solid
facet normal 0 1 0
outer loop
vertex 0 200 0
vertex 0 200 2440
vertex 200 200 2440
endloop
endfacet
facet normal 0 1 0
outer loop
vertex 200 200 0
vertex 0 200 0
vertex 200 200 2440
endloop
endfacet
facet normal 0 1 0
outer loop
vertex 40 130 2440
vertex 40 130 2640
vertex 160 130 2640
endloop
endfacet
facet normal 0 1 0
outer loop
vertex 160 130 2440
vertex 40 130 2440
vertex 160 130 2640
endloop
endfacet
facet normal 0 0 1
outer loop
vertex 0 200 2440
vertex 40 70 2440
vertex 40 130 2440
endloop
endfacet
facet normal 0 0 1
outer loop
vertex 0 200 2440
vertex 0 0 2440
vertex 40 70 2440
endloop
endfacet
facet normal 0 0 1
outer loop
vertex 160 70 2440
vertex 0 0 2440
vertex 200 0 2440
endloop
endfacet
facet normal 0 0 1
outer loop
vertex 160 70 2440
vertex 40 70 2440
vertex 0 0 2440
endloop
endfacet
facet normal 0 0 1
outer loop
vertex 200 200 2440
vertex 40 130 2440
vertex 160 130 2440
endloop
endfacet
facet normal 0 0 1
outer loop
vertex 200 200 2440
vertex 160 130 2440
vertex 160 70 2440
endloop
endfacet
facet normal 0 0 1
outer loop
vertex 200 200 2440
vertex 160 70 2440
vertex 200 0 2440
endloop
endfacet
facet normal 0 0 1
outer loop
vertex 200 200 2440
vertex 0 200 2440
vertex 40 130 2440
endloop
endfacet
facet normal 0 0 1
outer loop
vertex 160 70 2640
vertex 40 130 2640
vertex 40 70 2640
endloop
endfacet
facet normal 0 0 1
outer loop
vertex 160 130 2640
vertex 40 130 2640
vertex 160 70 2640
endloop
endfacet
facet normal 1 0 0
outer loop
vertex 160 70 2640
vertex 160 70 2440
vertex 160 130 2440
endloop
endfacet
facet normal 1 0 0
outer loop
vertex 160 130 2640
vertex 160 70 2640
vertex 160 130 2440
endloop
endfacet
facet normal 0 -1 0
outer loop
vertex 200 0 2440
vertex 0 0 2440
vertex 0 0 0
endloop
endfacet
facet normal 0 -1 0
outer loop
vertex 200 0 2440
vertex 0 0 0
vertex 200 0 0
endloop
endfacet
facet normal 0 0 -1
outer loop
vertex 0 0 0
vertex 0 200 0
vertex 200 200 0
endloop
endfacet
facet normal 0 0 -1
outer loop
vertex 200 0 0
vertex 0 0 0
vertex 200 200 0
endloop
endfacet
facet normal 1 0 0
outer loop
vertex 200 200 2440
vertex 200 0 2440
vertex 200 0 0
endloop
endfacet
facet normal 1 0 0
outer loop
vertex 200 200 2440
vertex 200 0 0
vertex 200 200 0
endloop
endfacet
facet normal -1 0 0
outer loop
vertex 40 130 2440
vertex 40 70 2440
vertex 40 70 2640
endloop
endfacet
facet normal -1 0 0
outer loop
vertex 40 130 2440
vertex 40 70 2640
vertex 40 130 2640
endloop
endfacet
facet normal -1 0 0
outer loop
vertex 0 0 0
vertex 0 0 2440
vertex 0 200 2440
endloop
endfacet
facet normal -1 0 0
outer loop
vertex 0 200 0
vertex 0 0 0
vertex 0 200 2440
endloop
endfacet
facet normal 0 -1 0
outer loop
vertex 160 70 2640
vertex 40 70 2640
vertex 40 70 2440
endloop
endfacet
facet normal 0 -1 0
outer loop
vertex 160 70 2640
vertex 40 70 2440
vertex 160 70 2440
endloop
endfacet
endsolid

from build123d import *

# Parameters (mm, degrees)
F0_W     = 200
F0_H     = 200
F1_DEPTH = 2640
F2_W     = 200
F2_H     = 200
F2_W_2   = 120
F2_H_2   = 60
F3_DEPTH = 200


with BuildPart() as f1:
    # F0 (on Top) → F1 (new body)
    with BuildSketch(Plane.XY):
        with Locations((100, 100)):
            Rectangle(F0_W, F0_H)
    extrude(amount=F1_DEPTH)

    # F2 (on face) → F3 (cut)
    with BuildSketch(Plane.XY.offset(2640)):
        with Locations((100, 100)):
            Rectangle(F2_W, F2_H)
        with Locations((100, 100)):
            Rectangle(F2_W_2, F2_H_2, mode=Mode.SUBTRACT)
    extrude(amount=-F3_DEPTH, mode=Mode.SUBTRACT)


solid = f1.part
